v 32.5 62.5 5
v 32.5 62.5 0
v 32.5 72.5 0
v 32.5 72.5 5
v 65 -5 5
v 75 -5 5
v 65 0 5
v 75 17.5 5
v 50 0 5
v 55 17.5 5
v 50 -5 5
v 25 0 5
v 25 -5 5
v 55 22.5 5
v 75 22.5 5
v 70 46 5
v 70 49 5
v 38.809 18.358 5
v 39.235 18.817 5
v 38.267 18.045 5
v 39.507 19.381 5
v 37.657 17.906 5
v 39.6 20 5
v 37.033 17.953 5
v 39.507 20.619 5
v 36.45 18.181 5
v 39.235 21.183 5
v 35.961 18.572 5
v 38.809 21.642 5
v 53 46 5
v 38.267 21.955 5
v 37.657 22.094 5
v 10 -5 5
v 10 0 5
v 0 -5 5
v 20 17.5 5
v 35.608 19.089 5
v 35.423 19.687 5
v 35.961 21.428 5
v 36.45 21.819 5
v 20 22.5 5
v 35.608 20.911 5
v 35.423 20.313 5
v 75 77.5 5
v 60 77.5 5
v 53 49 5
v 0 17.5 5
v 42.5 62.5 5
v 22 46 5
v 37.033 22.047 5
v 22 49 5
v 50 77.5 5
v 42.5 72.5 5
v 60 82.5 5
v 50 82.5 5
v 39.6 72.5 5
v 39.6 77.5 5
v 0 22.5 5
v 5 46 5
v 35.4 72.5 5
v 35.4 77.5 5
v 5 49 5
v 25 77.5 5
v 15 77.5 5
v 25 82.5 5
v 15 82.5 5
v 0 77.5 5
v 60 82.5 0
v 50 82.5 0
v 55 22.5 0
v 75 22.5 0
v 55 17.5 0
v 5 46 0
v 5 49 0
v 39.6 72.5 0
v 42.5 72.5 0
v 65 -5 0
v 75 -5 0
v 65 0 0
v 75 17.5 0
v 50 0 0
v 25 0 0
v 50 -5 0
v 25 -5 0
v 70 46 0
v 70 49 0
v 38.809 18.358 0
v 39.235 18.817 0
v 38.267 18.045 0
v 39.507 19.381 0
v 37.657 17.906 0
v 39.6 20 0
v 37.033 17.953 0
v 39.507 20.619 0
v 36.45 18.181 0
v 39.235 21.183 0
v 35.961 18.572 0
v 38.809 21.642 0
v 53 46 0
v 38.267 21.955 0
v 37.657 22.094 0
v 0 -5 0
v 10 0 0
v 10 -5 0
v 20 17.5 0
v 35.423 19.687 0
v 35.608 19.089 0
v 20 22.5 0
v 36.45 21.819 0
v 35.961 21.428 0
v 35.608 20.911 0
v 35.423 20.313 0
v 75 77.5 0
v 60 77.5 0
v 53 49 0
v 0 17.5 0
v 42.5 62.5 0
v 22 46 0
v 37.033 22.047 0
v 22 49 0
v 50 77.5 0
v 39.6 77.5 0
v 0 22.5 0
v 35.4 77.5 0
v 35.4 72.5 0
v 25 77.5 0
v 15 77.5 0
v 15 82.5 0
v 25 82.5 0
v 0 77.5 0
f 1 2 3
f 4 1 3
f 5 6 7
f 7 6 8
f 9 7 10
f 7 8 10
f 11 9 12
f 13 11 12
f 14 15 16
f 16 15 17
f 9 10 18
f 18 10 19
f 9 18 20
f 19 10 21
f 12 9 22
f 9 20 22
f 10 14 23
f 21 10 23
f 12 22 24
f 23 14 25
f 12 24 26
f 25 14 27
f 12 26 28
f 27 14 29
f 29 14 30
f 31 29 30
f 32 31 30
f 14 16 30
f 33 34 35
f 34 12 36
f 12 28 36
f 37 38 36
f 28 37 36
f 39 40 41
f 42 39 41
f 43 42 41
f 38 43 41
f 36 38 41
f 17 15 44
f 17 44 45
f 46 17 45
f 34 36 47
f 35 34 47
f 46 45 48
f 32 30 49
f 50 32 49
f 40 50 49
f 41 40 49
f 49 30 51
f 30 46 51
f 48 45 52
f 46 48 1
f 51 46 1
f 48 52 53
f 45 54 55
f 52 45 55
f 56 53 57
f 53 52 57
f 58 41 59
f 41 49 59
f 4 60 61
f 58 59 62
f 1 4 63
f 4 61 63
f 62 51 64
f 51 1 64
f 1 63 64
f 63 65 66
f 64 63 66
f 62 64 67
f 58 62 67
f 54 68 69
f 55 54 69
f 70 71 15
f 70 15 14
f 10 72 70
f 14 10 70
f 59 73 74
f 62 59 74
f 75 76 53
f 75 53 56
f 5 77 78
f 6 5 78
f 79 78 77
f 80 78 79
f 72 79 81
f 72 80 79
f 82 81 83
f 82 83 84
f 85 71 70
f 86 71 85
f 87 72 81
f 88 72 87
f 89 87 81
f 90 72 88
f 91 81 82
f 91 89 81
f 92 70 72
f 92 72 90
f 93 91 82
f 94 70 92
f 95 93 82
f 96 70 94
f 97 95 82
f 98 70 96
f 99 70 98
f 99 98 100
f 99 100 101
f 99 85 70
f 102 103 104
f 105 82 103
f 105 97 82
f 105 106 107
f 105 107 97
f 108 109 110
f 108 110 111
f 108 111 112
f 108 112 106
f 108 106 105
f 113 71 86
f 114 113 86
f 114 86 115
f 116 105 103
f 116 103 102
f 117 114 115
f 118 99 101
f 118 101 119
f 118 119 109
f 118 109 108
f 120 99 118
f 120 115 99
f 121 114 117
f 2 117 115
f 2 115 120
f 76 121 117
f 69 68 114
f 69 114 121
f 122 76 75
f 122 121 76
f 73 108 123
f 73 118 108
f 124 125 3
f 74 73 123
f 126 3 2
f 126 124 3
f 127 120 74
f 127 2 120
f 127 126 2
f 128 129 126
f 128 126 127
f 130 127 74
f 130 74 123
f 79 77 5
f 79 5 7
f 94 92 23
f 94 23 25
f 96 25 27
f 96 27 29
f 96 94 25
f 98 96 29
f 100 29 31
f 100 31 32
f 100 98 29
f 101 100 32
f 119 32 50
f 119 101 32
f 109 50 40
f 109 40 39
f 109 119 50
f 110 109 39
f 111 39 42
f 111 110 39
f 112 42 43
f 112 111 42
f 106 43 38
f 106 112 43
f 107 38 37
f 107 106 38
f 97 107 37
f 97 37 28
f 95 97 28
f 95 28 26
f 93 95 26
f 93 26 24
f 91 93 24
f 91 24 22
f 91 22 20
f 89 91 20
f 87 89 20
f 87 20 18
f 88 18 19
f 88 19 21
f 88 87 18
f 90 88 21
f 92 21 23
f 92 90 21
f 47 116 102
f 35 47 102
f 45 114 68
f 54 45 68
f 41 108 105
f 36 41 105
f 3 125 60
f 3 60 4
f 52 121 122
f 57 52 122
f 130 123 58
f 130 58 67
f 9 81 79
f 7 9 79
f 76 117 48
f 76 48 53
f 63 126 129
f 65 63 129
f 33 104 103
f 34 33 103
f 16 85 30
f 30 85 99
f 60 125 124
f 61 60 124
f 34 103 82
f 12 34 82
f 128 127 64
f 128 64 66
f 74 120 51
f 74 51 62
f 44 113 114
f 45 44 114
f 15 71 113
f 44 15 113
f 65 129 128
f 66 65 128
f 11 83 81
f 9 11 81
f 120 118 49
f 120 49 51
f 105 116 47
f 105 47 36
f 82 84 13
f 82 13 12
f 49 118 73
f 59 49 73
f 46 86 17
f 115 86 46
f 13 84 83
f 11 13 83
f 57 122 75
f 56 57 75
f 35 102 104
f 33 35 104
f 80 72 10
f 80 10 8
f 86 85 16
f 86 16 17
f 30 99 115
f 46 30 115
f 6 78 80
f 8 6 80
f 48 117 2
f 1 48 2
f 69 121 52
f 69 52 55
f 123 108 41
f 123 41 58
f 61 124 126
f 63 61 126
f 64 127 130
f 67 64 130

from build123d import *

# Parameters (mm, degrees)
SKETCH1_W           = 75
SKETCH1_H           = 17.5
SKETCH1_R           = 2.1
SKETCH1_W_2         = 10
SKETCH1_H_2         = 5
SKETCH1_W_3         = 25
BOSS_EXTRUDE1_DEPTH = 5
SKETCH2_W           = 75
SKETCH2_H           = 55
BOSS_EXTRUDE2_DEPTH = 5
SKETCH3_W           = 10
SKETCH3_H           = 5
BOSS_EXTRUDE3_DEPTH = 5
SKETCH4_W           = 4.2
SKETCH4_H           = 5
SKETCH4_H_2         = 3.2
SKETCH4_H_3         = 1.8
SKETCH4_W_2         = 1.4
CUT_EXTRUDE1_DEPTH  = 5
SKETCH5_W           = 10
SKETCH5_H           = 10
CUT_EXTRUDE2_DEPTH  = 5
SKETCH6_W           = 17.000000092
SKETCH6_H           = 3
CUT_EXTRUDE3_DEPTH  = 10


with BuildPart() as part:
    # Sketch1 → Boss-Extrude1 (new body)
    with BuildSketch(Plane.XY):
        with Locations((37.5, 8.75)):
            Rectangle(SKETCH1_W, SKETCH1_H)
        Polygon((20, 22.5), (20, 17.5), (55, 17.5), (55, 22.5), (41.830127019, 22.5), (33.169872981, 22.5), align=None)
        with Locations((37.5, 20)):
            Circle(SKETCH1_R, mode=Mode.SUBTRACT)
        with BuildLine():
            ThreePointArc((41.830127019, 22.5), (37.5, 25), (33.169872981, 22.5))
            Line((33.169872981, 22.5), (41.830127019, 22.5))
        make_face()
        Polygon((0, 17.5), (0, 0), (10, 0), (25, 0), (50, 0), (65, 0), (75, 0), (75, 17.5), (55, 17.5), (20, 17.5), align=None)
        with Locations((70, -2.5)):
            Rectangle(SKETCH1_W_2, SKETCH1_H_2)
        with Locations((37.5, -2.5)):
            Rectangle(SKETCH1_W_3, SKETCH1_H_2)
        with Locations((5, -2.5)):
            Rectangle(SKETCH1_W_2, SKETCH1_H_2)
    extrude(amount=BOSS_EXTRUDE1_DEPTH)

    # Sketch2 → Boss-Extrude2 (add)
    with BuildSketch(Plane(origin=(0, 0, 0), x_dir=(-1, 0, 0), z_dir=(0, 0, -1))):
        with Locations((-37.5, 50)):
            Rectangle(SKETCH2_W, SKETCH2_H)
    extrude(amount=-BOSS_EXTRUDE2_DEPTH)

    # Sketch3 → Boss-Extrude3 (add)
    with BuildSketch(Plane(origin=(0, 0, 0), x_dir=(-1, 0, 0), z_dir=(0, 0, -1))):
        with Locations((-55, 80)):
            Rectangle(SKETCH3_W, SKETCH3_H)
        with Locations((-20, 80)):
            Rectangle(SKETCH3_W, SKETCH3_H)
    extrude(amount=-BOSS_EXTRUDE3_DEPTH)

    # Sketch4 → Cut-Extrude1 (cut)
    with BuildSketch(Plane(origin=(0, 0, 0), x_dir=(-1, 0, 0), z_dir=(0, 0, -1))):
        with Locations((-37.5, 75)):
            Rectangle(SKETCH4_W, SKETCH4_H)
        with Locations((-37.5, 70.9)):
            Rectangle(SKETCH4_W, SKETCH4_H_2)
        with Locations((-37.5, 68.4)):
            Rectangle(SKETCH4_W, SKETCH4_H_3)
        with Locations((-40.3, 70.9)):
            Rectangle(SKETCH4_W_2, SKETCH4_H_2)
        with Locations((-34.7, 70.9)):
            Rectangle(SKETCH4_W_2, SKETCH4_H_2)
    extrude(amount=-CUT_EXTRUDE1_DEPTH, mode=Mode.SUBTRACT)

    # Sketch5 → Cut-Extrude2 (cut)
    with BuildSketch(Plane(origin=(0, 0, 0), x_dir=(-1, 0, 0), z_dir=(0, 0, -1))):
        with Locations((-37.5, 67.5)):
            Rectangle(SKETCH5_W, SKETCH5_H)
    extrude(amount=-CUT_EXTRUDE2_DEPTH, mode=Mode.SUBTRACT)

    # Sketch6 → Cut-Extrude3 (cut)
    with BuildSketch(Plane(origin=(0, 0, 0), x_dir=(-1, 0, 0), z_dir=(0, 0, -1))):
        with Locations((-61.499999954, 47.499999965)):
            Rectangle(SKETCH6_W, SKETCH6_H)
        with Locations((-13.500000046, 47.499999965)):
            Rectangle(SKETCH6_W, SKETCH6_H)
    extrude(amount=-CUT_EXTRUDE3_DEPTH, mode=Mode.SUBTRACT)


solid = part.part
